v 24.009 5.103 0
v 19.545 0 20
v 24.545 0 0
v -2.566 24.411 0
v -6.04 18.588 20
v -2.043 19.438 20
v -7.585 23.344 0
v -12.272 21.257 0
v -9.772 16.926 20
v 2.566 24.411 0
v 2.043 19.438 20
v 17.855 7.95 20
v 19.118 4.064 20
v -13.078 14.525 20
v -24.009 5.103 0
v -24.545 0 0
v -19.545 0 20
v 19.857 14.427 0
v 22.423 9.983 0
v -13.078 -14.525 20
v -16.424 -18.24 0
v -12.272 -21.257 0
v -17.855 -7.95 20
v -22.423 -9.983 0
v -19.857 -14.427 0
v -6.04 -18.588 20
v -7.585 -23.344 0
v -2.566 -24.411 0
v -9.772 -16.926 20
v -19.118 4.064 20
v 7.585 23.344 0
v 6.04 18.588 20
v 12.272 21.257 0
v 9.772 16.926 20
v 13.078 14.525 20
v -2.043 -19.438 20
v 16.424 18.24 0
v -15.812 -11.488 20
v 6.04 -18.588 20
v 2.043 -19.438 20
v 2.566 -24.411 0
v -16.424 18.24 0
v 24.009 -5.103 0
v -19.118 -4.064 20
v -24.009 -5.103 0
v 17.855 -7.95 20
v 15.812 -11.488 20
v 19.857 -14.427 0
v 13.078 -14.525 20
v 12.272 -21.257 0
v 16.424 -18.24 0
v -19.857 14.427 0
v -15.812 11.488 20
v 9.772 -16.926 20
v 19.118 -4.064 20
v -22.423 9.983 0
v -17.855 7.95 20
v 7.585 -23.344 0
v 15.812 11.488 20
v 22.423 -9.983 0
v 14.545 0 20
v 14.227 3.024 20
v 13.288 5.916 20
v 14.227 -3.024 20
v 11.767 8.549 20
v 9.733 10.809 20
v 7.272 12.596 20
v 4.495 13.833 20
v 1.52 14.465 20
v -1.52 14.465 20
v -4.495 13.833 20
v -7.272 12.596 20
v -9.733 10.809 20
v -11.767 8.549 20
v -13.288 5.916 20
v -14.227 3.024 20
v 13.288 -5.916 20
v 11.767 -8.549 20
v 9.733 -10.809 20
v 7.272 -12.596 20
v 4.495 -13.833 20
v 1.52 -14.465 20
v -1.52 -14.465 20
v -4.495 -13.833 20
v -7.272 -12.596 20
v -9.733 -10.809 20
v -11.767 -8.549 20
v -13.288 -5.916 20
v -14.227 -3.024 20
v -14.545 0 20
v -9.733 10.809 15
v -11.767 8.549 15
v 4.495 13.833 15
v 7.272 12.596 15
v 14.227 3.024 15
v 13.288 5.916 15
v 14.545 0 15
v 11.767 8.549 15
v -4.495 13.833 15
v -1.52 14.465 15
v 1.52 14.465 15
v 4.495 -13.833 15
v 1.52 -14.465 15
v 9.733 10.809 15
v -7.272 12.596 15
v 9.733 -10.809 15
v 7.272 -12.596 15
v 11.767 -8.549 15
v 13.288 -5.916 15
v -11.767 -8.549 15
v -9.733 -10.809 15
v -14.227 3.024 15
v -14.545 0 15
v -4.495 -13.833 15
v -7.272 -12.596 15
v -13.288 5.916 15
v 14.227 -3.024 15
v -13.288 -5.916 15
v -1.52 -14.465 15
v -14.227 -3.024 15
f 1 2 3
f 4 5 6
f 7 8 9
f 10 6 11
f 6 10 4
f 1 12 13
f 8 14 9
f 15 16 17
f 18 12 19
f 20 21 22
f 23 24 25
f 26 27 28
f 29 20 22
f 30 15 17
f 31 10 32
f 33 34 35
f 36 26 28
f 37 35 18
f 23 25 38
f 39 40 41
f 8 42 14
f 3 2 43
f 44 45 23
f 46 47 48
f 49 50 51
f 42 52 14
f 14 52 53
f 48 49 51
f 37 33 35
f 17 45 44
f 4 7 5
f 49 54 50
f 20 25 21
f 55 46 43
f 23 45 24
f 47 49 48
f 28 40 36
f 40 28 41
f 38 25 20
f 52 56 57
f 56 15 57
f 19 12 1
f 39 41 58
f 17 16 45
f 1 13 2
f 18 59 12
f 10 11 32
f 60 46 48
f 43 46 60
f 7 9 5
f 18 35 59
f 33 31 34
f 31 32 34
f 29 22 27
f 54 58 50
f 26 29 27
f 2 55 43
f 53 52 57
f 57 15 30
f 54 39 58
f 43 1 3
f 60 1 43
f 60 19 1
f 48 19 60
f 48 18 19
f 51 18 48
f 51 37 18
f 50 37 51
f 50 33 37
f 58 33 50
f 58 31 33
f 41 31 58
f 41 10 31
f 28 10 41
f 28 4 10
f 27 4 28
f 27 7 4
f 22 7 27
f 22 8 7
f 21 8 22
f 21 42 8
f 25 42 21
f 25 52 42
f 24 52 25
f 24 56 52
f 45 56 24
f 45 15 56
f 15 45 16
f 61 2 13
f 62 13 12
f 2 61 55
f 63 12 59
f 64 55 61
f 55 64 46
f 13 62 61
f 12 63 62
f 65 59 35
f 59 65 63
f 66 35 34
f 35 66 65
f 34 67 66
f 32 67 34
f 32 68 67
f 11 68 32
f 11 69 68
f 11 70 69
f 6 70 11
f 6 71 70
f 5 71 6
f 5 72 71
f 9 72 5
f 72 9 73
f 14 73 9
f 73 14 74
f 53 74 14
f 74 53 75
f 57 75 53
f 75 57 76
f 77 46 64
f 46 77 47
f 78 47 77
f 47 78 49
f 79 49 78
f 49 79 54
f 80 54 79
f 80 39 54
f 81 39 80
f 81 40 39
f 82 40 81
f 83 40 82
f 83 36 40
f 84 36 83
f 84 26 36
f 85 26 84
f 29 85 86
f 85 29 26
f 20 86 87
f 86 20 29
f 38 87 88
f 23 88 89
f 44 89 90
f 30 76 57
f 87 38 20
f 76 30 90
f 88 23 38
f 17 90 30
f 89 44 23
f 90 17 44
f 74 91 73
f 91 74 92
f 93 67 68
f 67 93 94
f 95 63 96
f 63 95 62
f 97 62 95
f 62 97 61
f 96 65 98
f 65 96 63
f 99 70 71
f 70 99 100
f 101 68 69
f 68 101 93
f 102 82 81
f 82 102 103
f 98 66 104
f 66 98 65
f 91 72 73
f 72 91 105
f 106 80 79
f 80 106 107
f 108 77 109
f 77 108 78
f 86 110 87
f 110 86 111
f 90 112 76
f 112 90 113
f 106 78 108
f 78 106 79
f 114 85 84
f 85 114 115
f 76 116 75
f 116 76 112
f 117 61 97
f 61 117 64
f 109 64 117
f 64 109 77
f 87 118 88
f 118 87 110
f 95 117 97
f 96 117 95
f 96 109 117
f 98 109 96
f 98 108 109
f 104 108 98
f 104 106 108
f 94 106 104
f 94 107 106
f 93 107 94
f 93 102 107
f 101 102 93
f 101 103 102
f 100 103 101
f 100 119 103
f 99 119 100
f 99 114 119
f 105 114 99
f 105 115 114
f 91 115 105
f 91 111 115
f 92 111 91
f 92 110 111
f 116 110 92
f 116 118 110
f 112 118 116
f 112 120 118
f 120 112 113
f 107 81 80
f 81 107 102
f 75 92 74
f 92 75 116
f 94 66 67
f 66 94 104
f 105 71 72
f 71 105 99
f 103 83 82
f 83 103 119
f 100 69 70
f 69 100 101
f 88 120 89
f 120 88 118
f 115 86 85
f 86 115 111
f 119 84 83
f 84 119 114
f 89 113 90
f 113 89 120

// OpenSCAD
/**
 * Bumpers for the feet of our dresser, so our Roomba can go underneath.
 *
 * All measurements are in millimeters.
 *
 * Parameters:
 *   - foot_diameter: Diameter of each foot (feet are circular).
 *   - horizontal_thickness: Horizontal thickness.
 *   - base_horizontal_thickness: Base horizontal thickness.
 *   - vertical_thickness: Vertical thickness.
 *   - inlet_depth: Depth of the inlet (for keeping feet centered).
 *   - padding: Padding on each side.
 */

foot_diameter = 27.09;
horizontal_thickness = 5;
base_horizontal_thickness = 10;
vertical_thickness = 15;
inlet_depth = 5;
padding = 1;

difference() {
    cylinder(
        vertical_thickness + inlet_depth,
        d1=foot_diameter + base_horizontal_thickness * 2 + padding * 2,
        d2=foot_diameter + horizontal_thickness * 2 + padding * 2
    );
    translate([0, 0, vertical_thickness])
        cylinder(inlet_depth + padding, d=foot_diameter + padding * 2);
}
